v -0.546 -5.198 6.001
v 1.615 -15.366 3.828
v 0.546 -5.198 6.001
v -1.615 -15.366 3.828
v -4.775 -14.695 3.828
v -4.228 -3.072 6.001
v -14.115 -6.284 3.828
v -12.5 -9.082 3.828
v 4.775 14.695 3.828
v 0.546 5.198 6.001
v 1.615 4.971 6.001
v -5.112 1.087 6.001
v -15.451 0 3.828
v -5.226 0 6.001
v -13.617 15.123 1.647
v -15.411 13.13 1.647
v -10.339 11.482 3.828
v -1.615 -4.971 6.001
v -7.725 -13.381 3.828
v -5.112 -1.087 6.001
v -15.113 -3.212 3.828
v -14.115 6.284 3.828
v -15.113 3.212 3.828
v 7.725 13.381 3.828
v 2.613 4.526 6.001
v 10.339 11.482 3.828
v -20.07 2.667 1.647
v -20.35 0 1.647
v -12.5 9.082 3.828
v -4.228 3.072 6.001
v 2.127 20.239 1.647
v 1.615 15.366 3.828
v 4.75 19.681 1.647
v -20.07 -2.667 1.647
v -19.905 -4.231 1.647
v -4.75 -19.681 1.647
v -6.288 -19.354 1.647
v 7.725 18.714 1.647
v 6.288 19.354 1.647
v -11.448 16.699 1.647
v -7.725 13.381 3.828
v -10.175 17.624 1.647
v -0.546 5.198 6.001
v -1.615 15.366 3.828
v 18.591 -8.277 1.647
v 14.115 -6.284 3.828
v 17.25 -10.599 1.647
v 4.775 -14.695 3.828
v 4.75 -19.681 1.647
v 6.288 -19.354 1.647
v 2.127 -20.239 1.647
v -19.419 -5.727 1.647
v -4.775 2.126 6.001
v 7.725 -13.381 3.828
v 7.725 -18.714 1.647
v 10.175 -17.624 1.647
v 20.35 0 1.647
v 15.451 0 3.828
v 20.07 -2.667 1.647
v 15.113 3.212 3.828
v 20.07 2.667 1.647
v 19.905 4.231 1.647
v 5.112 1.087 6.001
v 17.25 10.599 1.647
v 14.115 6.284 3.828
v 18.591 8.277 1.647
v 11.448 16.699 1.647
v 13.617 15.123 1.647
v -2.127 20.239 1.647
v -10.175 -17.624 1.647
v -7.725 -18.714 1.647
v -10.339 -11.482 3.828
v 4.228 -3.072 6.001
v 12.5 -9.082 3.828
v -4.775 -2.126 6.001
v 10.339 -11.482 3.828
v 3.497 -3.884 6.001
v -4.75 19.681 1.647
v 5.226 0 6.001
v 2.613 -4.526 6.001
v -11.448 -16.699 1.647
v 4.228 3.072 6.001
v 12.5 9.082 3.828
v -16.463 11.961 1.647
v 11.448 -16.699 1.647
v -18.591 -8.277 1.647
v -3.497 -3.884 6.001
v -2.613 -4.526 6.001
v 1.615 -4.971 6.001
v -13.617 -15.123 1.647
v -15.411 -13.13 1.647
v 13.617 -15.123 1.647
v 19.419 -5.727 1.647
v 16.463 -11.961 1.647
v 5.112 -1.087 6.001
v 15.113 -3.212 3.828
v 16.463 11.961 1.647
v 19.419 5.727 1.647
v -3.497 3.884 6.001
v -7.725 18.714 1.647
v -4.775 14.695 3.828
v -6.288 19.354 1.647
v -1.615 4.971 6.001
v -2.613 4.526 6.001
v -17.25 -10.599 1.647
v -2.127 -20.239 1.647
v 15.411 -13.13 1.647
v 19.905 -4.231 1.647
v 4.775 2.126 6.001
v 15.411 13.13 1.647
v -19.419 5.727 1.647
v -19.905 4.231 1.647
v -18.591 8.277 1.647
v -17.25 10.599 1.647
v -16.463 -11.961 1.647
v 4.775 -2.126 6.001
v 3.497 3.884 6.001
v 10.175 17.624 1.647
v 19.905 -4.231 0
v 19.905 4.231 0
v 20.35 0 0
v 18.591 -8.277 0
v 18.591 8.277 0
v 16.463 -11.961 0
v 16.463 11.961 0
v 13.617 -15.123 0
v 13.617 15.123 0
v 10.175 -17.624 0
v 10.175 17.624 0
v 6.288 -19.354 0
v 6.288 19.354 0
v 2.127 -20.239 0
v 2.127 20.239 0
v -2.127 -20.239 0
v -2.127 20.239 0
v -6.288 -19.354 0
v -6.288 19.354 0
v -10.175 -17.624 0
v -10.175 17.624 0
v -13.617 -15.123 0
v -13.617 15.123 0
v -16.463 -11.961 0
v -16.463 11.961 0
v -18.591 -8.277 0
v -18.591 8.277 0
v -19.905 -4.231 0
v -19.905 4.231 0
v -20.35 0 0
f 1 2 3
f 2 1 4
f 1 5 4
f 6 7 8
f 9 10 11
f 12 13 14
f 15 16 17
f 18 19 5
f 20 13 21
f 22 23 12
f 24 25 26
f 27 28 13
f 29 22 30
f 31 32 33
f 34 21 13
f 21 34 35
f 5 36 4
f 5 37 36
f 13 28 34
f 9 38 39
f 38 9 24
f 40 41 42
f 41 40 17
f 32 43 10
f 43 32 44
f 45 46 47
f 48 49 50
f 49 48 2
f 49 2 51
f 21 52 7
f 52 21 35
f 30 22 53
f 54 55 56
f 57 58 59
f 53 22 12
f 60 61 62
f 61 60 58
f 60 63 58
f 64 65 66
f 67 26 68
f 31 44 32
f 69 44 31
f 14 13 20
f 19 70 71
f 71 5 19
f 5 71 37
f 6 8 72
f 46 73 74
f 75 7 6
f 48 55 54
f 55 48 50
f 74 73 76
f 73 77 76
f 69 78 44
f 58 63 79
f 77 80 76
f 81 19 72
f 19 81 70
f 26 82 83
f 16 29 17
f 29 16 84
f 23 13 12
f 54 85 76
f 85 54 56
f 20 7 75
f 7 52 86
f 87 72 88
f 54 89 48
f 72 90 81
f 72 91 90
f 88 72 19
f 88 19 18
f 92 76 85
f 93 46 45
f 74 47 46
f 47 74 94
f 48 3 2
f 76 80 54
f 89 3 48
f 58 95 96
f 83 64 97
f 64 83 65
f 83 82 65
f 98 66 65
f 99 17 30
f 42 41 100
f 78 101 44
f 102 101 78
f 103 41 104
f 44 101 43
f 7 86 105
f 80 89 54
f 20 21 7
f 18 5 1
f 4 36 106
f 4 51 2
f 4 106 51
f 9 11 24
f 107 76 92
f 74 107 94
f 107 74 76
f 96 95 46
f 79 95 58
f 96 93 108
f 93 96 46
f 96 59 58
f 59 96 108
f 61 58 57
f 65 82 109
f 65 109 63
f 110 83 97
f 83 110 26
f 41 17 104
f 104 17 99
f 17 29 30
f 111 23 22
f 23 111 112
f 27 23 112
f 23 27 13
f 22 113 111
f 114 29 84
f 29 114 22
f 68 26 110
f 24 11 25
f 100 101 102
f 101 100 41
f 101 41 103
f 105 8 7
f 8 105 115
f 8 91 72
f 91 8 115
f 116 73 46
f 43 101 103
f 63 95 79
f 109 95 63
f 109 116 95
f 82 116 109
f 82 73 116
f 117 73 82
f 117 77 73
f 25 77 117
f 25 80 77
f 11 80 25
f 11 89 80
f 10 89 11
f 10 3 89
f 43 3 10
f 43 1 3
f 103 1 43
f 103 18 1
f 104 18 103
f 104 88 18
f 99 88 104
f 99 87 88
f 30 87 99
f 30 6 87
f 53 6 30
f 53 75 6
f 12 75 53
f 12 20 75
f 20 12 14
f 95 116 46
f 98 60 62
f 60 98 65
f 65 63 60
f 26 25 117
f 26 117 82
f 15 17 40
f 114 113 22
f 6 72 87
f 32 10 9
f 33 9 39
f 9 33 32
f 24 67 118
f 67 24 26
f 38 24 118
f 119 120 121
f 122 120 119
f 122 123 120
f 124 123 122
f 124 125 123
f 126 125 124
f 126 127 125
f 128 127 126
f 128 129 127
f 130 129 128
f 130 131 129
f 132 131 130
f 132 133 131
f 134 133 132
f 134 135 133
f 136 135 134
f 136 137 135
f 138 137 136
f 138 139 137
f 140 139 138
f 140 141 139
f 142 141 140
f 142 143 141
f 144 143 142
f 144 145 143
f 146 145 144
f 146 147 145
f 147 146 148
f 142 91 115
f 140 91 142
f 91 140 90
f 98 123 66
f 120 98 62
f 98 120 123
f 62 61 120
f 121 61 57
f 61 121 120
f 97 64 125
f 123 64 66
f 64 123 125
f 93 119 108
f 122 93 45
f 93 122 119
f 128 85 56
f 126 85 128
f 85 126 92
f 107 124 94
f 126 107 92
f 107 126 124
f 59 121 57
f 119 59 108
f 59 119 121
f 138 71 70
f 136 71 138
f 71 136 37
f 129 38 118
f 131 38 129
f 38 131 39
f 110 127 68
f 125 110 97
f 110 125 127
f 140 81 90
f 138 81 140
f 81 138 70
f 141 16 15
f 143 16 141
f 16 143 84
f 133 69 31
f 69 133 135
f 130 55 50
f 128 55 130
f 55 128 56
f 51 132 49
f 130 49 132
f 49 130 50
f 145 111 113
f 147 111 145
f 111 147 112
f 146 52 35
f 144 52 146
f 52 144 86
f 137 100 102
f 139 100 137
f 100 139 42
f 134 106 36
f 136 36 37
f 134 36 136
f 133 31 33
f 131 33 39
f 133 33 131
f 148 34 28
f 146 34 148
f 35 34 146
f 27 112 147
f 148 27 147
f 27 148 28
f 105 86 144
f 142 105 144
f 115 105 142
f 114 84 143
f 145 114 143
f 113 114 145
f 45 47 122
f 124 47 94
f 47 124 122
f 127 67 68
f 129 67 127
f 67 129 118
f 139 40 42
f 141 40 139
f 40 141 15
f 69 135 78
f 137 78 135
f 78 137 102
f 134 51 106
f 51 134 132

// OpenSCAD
// file: Lens.scad
// Puzzlebox Bloom
//
// component: Lens
//
// by Puzzlebox Productions 
// http://puzzlebox.io/bloom
//
// Copyright: Puzzlebox Productions, LLC (2014)
//
// License: Creative Commons - Attribution - Share Alike
//          https://creativecommons.org/licenses/by-sa/3.0


// Modules

module lens(lens_resolution) {
	// 	difference(){
	// 		translate([0,0,-lens_radius+lens_height])
	// 		sphere(r=lens_radius,$fn=lens_resolution, center=true);
	// 		
	// 		translate([0,0,-crop_cube_size/2])
	// 		cube([crop_cube_size,crop_cube_size,crop_cube_size], center=true);
	// 	}
	
	// 	translate([0,0,0.1])
	translate([0,0,lens_position_adjustment])
	difference(){
		translate([0,0,lens_sphere_position])
		sphere(r=lens_radius,$fn=lens_resolution, center=true);
		
		translate([0,0,lens_crop_position])
		cube([crop_cube_size,crop_cube_size,crop_cube_size], center=true);
	}
}


module lens_crop(lens_resolution) {
	
	// 	translate([0,0,0.1])
	difference(){
		translate([0,0,lens_position_adjustment])
		difference(){
			translate([0,0,lens_sphere_position])
			sphere(r=lens_radius,$fn=lens_resolution, center=true);
			
			translate([0,0,lens_crop_position])
			cube([crop_cube_size,crop_cube_size,crop_cube_size], center=true);
			
		}
		translate([0,0,-10])
// 		cylinder(r=20,h=200,$fn=lens_resolution); // r4 - matches lens_radius = 50 on Ultimaker2
// 		cylinder(r=20.75,h=200,$fn=lens_resolution); // r5, r6
		cylinder(r=20.35,h=200,$fn=lens_resolution); // r7 
	}
}


module lens_inner(lens_resolution) {
	
	difference(){
		lens(lens_resolution);
		lens_crop(lens_resolution);
	}
}


// Main
// lens_inner(lens_resolution);
// main file
// Puzzlebox Bloom
//
// component: Lens
//
// by Puzzlebox Productions, LLC
// http://puzzlebox.io/bloom
//
// Copyright: Puzzlebox Productions, LLC (2014)
//
// License: Creative Commons - Attribution - Share Alike
//          https://creativecommons.org/licenses/by-sa/3.0


// Rendering quality (calculated via angle in degrees)
$fa=3;
$fn=300;
lens_resolution=360;


// Libraries
include <../Configuration.scad>
include <../lens/Lens.scad>


// Main
lens_inner(lens_resolution);
